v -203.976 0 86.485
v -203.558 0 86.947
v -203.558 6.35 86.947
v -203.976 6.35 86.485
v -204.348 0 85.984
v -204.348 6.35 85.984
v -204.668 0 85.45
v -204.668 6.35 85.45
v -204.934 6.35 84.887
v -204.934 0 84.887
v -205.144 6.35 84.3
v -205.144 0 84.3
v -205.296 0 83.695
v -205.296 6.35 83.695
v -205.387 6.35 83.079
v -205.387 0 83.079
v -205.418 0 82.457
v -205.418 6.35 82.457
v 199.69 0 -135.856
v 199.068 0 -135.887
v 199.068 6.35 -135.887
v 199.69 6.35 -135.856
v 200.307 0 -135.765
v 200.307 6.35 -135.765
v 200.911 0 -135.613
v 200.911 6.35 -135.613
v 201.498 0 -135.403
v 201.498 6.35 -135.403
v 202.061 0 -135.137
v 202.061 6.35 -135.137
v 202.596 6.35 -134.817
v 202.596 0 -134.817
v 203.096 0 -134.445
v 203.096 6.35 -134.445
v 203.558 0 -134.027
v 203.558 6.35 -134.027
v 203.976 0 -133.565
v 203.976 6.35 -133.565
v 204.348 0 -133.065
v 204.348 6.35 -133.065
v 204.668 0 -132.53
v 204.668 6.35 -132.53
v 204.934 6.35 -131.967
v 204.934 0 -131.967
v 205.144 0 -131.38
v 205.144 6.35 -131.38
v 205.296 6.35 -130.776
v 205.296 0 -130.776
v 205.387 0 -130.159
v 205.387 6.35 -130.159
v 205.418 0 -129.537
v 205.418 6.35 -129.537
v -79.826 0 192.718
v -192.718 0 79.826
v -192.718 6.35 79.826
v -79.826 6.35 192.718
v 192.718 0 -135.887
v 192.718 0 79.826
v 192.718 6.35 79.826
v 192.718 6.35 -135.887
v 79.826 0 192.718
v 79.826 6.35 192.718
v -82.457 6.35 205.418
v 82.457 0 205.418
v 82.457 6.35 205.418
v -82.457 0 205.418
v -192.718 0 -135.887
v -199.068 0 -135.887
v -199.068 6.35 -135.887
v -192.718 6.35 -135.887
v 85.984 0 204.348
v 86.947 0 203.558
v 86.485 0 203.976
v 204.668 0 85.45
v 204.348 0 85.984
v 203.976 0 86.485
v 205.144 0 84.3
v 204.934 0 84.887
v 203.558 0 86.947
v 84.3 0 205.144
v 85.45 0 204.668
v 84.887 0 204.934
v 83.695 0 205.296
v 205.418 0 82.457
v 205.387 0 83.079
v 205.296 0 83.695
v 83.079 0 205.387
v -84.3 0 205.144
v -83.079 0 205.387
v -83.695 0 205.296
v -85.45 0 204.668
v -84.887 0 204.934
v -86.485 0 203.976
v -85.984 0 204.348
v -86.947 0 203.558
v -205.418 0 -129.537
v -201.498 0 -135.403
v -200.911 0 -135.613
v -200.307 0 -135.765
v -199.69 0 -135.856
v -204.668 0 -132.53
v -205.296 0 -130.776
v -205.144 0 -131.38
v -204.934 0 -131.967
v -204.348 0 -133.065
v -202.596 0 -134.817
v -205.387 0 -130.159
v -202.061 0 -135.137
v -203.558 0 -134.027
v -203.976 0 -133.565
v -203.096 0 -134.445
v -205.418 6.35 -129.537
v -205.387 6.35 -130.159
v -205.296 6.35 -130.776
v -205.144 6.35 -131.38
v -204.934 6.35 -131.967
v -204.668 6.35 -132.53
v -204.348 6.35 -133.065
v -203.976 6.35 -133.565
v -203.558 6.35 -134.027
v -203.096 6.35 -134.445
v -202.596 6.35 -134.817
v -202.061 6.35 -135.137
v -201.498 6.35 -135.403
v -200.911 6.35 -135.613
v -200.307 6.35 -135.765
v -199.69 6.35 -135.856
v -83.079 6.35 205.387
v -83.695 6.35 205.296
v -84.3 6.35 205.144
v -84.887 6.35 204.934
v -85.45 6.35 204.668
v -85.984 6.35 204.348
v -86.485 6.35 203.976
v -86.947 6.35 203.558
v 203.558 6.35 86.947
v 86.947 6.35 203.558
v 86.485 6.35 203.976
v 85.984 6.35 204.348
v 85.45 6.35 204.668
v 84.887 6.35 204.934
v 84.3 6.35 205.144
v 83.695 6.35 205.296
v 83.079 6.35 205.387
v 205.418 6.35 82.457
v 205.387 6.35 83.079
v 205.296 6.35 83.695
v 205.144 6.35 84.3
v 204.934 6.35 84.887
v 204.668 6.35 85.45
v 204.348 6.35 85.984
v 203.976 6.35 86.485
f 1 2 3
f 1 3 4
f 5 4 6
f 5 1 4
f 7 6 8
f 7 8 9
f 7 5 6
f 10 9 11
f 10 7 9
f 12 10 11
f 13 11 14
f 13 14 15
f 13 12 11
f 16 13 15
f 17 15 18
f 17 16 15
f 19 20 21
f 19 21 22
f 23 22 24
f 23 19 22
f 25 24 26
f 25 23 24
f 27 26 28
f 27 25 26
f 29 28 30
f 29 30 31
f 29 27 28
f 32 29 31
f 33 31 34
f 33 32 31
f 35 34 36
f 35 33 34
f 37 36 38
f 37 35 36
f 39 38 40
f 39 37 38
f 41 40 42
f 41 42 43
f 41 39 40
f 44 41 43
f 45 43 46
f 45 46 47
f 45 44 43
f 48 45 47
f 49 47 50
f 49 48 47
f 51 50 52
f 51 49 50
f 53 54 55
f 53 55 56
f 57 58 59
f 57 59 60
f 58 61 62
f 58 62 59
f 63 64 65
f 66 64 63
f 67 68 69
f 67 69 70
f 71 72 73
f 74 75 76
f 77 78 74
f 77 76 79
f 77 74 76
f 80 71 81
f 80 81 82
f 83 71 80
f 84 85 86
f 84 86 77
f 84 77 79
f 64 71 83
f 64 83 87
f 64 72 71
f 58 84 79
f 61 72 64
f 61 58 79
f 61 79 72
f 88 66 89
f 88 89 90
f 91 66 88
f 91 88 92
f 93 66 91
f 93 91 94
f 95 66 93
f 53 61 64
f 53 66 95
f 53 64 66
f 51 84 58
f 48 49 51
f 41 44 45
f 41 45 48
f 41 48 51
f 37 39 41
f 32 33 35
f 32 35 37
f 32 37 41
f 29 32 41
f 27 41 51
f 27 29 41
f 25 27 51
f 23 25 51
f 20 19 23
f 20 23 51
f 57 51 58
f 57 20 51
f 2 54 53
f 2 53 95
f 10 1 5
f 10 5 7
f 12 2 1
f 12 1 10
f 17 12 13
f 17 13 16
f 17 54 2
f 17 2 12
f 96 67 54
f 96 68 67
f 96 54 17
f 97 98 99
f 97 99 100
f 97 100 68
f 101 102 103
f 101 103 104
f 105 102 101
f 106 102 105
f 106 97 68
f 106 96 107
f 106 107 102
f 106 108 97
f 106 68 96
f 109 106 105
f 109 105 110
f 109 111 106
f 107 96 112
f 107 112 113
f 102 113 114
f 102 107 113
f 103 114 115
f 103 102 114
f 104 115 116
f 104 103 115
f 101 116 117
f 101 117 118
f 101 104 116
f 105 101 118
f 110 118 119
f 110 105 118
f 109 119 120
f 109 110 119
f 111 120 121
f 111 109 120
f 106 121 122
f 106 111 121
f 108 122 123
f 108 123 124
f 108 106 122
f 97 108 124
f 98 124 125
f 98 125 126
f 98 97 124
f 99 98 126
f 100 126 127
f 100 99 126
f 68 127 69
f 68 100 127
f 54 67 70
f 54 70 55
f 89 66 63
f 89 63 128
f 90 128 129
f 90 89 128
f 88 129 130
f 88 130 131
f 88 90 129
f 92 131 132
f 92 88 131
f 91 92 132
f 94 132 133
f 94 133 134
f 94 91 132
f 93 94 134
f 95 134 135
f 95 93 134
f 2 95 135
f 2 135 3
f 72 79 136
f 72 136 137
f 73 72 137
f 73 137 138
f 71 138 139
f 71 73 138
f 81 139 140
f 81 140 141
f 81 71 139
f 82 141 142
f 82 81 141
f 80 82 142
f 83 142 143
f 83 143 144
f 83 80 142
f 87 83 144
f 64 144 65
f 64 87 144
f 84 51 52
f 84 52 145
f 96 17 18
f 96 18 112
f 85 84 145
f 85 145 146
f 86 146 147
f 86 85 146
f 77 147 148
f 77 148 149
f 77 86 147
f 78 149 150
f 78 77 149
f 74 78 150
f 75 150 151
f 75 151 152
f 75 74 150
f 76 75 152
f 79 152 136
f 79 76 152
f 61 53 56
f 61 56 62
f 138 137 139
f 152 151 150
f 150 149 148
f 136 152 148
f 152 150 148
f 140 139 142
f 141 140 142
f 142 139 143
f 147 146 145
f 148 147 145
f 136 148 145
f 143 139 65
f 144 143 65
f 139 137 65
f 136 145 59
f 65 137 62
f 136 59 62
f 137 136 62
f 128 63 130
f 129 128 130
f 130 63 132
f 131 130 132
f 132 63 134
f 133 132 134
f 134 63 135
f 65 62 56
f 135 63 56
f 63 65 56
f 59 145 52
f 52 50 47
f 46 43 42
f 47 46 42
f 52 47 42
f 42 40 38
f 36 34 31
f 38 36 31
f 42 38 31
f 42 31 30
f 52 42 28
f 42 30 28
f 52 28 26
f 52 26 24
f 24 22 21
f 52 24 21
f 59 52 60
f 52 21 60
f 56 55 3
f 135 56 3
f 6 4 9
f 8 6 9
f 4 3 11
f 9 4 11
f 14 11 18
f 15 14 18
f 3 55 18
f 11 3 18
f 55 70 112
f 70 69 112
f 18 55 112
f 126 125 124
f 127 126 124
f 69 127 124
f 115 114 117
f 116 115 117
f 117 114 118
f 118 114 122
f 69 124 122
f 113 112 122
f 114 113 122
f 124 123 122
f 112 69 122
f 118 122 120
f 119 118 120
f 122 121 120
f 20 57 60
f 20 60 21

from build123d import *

# Parameters (mm, degrees)
BOSS_EXTRUDE1_DEPTH = 6.35


with BuildPart() as part:
    # Sketch1 → Boss-Extrude1 (new body)
    with BuildSketch(Plane(origin=(0, 0, 0), x_dir=(1, 0, 0), z_dir=(0, 1, 0))):
        with BuildLine():
            Line((-192.717689271, 135.886792847), (-192.717689271, -79.826280605))
            Line((-192.717689271, -79.826280605), (-79.826280605, -192.717689271))
            Line((-79.826280605, -192.717689271), (79.826280605, -192.717689271))
            Line((79.826280605, -192.717689271), (192.717689271, -79.826280605))
            Line((192.717689271, -79.826280605), (192.717689271, 135.886792847))
            Line((192.717689271, 135.886792847), (199.067689271, 135.886792847))
            ThreePointArc((199.067689271, 135.886792847), (203.557817332, 134.026920908), (205.417689271, 129.536792847))
            Line((205.417689271, 129.536792847), (205.417689271, 85.086792847))
            Line((205.417689271, 85.086792847), (205.417689271, -82.456536726))
            ThreePointArc((205.417689271, -82.456536726), (204.934324303, -84.886576522), (203.557817332, -86.946664787))
            Line((203.557817332, -86.946664787), (86.946664787, -203.557817332))
            ThreePointArc((86.946664787, -203.557817332), (84.886576522, -204.934324303), (82.456536726, -205.417689271))
            Line((82.456536726, -205.417689271), (-82.456536726, -205.417689271))
            ThreePointArc((-82.456536726, -205.417689271), (-84.886576522, -204.934324303), (-86.946664787, -203.557817332))
            Line((-86.946664787, -203.557817332), (-203.557817332, -86.946664787))
            ThreePointArc((-203.557817332, -86.946664787), (-204.934324303, -84.886576522), (-205.417689271, -82.456536726))
            Line((-205.417689271, -82.456536726), (-205.417689271, 85.086792847))
            Line((-205.417689271, 85.086792847), (-205.417689271, 129.536792847))
            ThreePointArc((-205.417689271, 129.536792847), (-203.557817332, 134.026920908), (-199.067689271, 135.886792847))
            Line((-199.067689271, 135.886792847), (-192.717689271, 135.886792847))
        make_face()
    extrude(amount=BOSS_EXTRUDE1_DEPTH)


solid = part.part
